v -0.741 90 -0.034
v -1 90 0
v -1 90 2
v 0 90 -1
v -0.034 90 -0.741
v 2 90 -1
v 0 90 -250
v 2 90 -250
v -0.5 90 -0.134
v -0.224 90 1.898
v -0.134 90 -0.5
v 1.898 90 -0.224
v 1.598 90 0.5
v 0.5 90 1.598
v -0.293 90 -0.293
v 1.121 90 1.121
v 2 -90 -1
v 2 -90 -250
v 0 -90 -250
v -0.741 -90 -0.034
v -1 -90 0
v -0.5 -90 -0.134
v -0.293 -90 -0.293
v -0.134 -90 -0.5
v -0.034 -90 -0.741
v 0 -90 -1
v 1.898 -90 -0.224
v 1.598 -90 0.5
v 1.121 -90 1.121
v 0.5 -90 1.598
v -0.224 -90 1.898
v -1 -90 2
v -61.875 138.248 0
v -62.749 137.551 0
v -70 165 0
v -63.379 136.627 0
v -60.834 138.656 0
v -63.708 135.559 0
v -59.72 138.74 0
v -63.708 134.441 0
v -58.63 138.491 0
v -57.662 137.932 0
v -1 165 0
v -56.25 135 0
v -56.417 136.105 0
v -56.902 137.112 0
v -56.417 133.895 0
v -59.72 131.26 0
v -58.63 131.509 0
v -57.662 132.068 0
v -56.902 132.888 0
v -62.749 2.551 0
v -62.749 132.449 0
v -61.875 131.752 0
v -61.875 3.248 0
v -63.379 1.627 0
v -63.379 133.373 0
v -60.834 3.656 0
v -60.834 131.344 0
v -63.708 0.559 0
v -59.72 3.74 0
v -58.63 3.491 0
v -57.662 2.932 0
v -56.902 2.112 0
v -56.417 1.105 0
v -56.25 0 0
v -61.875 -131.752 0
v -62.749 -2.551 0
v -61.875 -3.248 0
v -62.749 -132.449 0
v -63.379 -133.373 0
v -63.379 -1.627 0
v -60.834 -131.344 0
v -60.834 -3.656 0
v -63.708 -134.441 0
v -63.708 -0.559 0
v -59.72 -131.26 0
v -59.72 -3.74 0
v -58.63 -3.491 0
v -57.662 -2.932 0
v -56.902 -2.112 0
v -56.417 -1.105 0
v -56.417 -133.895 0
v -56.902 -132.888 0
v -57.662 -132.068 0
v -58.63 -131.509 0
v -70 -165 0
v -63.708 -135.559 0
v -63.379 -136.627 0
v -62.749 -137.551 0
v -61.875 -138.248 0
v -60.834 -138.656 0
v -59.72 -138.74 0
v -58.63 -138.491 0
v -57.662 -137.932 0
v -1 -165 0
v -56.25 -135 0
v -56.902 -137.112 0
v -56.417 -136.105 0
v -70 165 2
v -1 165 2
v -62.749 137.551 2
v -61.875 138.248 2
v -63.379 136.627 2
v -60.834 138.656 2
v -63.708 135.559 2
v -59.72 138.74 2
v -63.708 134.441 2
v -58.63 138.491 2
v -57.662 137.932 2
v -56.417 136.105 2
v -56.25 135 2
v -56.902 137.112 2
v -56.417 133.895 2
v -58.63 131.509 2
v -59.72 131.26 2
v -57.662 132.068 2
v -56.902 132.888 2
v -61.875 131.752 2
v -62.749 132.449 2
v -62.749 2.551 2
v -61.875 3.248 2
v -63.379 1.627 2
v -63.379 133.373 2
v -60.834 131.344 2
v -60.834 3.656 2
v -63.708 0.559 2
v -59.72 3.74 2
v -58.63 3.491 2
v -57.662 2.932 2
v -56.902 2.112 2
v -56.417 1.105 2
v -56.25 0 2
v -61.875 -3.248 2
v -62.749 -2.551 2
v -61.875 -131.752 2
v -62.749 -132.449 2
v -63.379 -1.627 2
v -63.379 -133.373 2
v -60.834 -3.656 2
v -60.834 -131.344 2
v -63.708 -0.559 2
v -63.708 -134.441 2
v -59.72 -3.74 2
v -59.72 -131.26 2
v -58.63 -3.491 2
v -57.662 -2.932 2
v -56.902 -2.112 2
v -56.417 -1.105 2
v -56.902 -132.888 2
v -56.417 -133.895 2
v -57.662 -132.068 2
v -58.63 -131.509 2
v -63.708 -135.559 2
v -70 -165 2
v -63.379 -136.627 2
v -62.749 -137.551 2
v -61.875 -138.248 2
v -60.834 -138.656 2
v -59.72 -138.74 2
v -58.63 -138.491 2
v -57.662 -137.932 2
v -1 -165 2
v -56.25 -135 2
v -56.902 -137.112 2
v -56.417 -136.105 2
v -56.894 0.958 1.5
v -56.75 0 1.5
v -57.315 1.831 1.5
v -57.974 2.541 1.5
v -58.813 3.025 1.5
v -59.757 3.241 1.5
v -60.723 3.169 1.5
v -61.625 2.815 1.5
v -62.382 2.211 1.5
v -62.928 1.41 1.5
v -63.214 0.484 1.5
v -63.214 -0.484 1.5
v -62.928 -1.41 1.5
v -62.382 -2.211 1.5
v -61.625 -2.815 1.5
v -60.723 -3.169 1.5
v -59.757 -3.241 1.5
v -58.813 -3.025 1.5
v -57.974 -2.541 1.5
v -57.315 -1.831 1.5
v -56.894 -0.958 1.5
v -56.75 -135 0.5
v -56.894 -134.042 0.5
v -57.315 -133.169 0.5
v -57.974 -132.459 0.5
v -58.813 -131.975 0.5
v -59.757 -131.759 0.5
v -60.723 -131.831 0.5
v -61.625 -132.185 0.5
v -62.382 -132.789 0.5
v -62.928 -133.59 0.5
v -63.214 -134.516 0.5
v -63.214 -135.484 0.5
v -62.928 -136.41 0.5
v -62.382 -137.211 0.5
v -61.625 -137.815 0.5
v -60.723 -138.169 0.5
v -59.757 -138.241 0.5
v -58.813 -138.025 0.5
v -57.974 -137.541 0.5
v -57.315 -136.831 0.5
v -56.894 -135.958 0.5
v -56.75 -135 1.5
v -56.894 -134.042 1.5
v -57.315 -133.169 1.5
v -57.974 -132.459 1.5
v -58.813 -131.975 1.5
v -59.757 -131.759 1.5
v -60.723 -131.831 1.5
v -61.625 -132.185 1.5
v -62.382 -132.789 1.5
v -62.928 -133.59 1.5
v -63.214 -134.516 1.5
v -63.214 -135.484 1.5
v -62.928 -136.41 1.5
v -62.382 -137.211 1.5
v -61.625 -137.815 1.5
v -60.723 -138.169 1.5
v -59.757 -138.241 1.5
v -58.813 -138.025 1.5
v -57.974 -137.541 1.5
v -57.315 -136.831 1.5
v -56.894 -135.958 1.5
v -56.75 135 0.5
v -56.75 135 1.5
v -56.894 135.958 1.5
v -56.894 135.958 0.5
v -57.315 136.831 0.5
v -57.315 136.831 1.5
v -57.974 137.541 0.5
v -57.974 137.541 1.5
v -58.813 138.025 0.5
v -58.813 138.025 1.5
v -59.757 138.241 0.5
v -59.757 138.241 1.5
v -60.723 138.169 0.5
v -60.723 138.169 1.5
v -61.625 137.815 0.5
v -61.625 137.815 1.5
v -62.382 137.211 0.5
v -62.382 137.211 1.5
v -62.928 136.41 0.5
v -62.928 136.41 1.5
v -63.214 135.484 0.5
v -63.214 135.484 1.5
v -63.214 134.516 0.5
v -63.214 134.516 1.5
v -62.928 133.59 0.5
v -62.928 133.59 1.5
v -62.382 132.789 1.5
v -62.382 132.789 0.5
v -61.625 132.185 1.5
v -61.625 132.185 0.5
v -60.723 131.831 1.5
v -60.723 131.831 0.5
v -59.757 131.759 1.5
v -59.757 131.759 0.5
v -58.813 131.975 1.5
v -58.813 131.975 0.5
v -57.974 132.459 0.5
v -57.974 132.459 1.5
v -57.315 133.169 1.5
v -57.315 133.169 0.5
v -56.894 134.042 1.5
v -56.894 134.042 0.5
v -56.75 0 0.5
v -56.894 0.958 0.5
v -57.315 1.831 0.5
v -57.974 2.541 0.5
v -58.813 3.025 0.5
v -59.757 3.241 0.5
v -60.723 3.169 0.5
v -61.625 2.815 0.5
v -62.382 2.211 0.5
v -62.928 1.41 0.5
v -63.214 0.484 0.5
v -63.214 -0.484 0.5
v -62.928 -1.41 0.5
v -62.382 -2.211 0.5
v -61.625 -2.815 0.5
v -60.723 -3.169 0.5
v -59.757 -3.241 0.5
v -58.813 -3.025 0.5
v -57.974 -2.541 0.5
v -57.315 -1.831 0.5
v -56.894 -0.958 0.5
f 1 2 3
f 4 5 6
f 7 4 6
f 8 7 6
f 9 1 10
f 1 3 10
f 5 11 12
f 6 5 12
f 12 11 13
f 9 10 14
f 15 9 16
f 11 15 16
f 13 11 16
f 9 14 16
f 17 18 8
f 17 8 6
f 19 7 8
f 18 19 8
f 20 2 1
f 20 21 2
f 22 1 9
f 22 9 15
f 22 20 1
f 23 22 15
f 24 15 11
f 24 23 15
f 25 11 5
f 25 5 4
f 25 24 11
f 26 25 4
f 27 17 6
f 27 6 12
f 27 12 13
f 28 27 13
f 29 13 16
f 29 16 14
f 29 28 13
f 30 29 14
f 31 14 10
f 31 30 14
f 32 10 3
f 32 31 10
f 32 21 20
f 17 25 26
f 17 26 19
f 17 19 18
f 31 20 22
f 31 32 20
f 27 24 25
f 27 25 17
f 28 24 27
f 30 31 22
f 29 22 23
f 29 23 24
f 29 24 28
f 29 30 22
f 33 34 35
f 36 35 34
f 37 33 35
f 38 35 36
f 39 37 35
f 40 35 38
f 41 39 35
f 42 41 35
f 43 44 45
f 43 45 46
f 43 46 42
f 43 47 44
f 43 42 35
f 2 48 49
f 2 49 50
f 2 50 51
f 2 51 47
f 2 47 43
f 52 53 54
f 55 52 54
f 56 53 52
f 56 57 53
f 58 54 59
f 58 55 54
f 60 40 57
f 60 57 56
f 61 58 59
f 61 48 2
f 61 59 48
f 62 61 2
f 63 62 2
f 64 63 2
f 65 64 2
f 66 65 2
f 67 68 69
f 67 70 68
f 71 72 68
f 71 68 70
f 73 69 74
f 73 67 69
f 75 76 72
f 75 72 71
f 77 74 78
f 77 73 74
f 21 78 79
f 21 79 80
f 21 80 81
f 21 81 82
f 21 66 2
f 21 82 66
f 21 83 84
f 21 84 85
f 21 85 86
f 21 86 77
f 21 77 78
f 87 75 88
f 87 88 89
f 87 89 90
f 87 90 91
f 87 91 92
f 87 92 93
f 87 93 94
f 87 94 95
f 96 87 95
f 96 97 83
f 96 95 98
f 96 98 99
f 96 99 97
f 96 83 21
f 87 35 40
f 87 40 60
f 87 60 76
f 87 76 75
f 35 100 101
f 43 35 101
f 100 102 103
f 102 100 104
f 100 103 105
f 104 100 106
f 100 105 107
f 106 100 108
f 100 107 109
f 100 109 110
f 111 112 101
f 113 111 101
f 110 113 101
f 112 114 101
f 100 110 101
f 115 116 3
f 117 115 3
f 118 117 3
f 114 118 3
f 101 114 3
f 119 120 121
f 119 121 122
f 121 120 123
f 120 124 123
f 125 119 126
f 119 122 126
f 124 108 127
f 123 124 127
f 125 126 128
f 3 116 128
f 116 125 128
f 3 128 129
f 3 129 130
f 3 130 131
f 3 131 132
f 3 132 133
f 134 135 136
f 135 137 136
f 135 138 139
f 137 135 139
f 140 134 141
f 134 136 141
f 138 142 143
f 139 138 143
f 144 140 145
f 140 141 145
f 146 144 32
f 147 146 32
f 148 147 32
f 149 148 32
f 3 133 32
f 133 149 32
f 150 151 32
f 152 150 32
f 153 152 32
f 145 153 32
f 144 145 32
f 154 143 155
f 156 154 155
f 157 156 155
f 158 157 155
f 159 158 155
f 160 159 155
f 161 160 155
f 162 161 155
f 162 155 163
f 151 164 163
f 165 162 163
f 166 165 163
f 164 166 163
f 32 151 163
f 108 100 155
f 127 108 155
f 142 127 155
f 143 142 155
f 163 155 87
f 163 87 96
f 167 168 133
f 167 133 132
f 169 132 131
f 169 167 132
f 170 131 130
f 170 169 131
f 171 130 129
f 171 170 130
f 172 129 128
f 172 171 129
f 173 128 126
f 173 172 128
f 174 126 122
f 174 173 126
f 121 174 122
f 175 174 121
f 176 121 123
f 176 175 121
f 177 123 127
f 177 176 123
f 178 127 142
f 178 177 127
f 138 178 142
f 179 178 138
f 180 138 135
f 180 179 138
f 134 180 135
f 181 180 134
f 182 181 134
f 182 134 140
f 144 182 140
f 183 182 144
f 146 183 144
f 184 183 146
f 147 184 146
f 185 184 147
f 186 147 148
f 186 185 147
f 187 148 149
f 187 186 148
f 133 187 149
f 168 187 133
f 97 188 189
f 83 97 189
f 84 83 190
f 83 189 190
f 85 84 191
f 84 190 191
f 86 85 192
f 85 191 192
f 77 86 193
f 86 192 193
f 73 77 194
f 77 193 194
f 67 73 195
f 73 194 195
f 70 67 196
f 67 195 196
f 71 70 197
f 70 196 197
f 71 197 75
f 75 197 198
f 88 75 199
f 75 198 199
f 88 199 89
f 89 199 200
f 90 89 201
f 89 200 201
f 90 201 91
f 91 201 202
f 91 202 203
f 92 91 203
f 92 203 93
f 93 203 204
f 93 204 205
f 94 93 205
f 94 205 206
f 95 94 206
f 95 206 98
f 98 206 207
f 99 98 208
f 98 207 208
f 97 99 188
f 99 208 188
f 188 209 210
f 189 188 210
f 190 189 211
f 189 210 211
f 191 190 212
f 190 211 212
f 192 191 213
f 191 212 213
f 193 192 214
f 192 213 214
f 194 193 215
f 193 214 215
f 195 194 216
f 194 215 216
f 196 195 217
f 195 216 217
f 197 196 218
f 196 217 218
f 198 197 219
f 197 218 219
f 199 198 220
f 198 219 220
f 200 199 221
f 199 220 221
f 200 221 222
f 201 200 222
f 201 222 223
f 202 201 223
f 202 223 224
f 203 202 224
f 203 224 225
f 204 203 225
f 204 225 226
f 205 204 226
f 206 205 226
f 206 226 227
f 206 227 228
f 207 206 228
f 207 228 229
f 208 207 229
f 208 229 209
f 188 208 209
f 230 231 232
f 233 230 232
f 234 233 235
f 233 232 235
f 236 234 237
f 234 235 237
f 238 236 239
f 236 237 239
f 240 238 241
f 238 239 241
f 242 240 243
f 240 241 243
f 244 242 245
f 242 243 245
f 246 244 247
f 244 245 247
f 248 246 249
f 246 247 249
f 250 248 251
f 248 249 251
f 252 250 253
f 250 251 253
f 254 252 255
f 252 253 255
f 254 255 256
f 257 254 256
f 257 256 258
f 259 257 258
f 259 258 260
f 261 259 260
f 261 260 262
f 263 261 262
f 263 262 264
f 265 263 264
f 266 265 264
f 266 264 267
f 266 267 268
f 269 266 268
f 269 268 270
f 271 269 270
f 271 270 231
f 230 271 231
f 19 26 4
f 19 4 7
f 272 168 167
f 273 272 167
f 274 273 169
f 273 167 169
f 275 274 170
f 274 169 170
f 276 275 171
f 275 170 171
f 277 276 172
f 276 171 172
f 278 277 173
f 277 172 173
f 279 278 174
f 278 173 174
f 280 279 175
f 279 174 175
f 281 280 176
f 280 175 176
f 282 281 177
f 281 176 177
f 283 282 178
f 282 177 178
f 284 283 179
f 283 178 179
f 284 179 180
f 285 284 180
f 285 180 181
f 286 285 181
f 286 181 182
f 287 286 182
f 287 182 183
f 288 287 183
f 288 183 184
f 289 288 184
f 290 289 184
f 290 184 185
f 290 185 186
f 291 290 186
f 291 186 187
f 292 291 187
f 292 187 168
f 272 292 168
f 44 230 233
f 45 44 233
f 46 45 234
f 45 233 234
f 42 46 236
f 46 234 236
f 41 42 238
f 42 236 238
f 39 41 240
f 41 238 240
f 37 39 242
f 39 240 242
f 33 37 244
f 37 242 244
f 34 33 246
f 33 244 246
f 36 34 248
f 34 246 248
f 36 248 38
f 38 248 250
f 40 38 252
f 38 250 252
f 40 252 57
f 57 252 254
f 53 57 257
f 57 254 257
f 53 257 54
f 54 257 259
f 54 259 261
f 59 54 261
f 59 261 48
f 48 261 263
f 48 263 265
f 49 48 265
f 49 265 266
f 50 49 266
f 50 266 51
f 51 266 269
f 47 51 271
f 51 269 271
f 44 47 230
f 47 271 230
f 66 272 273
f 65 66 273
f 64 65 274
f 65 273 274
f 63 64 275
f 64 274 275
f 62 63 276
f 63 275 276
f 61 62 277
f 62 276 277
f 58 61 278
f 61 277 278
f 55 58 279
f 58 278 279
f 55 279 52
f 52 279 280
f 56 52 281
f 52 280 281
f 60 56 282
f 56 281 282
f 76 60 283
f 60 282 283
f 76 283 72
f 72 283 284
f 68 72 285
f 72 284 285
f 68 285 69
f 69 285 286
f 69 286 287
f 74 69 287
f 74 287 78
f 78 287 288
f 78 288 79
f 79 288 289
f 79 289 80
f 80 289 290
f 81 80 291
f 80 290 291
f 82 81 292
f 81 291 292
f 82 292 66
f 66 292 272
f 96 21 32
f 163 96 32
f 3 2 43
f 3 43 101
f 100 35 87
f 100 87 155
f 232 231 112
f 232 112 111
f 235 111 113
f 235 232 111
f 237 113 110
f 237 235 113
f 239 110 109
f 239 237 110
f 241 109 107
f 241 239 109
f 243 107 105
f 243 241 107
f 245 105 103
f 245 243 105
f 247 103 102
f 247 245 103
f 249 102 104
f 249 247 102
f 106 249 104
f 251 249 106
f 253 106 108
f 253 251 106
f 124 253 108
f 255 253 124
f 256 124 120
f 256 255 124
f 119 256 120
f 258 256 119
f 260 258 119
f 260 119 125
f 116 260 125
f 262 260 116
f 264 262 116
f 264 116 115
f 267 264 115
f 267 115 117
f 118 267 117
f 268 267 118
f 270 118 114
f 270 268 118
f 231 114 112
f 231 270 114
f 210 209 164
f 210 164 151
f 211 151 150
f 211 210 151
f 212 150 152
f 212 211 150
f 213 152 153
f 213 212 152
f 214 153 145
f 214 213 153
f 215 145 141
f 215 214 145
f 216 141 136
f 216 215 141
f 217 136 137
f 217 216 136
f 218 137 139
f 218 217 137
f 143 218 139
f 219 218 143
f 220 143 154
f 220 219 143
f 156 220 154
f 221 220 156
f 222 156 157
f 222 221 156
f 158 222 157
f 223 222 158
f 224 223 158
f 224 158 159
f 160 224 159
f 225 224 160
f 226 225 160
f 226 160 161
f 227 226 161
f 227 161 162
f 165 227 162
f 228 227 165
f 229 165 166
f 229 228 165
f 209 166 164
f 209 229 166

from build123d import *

# Parameters (mm, degrees)
F1_DEPTH = 90
F2_W     = 69
F2_H     = 2
F3_DEPTH = 75
F4_R     = 3.25
F5_DEPTH = 25
F6_SIZE  = 0.5


# Not quite as in the source:
# - a pattern or mirror of a feature is missing from the dataset's text; its kind, count and spacing are read off the source's solid


with BuildPart() as f1:
    # F0 (on Front) → F1 (new body, symmetric)
    with BuildSketch(Plane.XZ):
        with BuildLine():
            ThreePointArc((-1, 0), (-0.2928932188, -0.2928932188), (0, -1))
            Line((0, -1), (0, -250))
            Line((0, -250), (2, -250))
            Line((2, -250), (2, -1))
            ThreePointArc((2, -1), (1.1213203436, 1.1213203436), (-1, 2))
            Line((-1, 2), (-70, 2))
            Line((-70, 2), (-70, 0))
            Line((-70, 0), (-1, 0))
        make_face()
    extrude(amount=F1_DEPTH, both=True)

    # F2 (on face) → F3 (join)
    with BuildSketch(Plane.XZ.offset(90)):
        with Locations((-35.5, 1)):
            Rectangle(F2_W, F2_H)
    f3 = extrude(amount=F3_DEPTH)

    # F3_copies: F3 across plane
    add(f3.mirror(Plane.ZX))

    # F4 (on face) → F5 (cut)
    with BuildSketch(Plane.XY.offset(2)):
        with Locations((-60, 135)):
            Circle(F4_R)
        with Locations((-60, 0)):
            Circle(F4_R)
        with Locations((-60, -135)):
            Circle(F4_R)
    extrude(amount=-F5_DEPTH, mode=Mode.SUBTRACT)

    # F6
    f6_edges = [f1.edges().sort_by_distance(p)[0] for p in [
        (-63.25, 135, 2),
        (-56.75, 135, 1),
        (-63.25, 135, 0),
        (-63.25, 0, 2),
        (-56.75, 0, 1),
        (-63.25, 0, 0),
        (-63.25, -135, 2),
        (-56.75, -135, 1),
        (-63.25, -135, 0),
    ]]
    chamfer(f6_edges, length=F6_SIZE)


solid = f1.part
